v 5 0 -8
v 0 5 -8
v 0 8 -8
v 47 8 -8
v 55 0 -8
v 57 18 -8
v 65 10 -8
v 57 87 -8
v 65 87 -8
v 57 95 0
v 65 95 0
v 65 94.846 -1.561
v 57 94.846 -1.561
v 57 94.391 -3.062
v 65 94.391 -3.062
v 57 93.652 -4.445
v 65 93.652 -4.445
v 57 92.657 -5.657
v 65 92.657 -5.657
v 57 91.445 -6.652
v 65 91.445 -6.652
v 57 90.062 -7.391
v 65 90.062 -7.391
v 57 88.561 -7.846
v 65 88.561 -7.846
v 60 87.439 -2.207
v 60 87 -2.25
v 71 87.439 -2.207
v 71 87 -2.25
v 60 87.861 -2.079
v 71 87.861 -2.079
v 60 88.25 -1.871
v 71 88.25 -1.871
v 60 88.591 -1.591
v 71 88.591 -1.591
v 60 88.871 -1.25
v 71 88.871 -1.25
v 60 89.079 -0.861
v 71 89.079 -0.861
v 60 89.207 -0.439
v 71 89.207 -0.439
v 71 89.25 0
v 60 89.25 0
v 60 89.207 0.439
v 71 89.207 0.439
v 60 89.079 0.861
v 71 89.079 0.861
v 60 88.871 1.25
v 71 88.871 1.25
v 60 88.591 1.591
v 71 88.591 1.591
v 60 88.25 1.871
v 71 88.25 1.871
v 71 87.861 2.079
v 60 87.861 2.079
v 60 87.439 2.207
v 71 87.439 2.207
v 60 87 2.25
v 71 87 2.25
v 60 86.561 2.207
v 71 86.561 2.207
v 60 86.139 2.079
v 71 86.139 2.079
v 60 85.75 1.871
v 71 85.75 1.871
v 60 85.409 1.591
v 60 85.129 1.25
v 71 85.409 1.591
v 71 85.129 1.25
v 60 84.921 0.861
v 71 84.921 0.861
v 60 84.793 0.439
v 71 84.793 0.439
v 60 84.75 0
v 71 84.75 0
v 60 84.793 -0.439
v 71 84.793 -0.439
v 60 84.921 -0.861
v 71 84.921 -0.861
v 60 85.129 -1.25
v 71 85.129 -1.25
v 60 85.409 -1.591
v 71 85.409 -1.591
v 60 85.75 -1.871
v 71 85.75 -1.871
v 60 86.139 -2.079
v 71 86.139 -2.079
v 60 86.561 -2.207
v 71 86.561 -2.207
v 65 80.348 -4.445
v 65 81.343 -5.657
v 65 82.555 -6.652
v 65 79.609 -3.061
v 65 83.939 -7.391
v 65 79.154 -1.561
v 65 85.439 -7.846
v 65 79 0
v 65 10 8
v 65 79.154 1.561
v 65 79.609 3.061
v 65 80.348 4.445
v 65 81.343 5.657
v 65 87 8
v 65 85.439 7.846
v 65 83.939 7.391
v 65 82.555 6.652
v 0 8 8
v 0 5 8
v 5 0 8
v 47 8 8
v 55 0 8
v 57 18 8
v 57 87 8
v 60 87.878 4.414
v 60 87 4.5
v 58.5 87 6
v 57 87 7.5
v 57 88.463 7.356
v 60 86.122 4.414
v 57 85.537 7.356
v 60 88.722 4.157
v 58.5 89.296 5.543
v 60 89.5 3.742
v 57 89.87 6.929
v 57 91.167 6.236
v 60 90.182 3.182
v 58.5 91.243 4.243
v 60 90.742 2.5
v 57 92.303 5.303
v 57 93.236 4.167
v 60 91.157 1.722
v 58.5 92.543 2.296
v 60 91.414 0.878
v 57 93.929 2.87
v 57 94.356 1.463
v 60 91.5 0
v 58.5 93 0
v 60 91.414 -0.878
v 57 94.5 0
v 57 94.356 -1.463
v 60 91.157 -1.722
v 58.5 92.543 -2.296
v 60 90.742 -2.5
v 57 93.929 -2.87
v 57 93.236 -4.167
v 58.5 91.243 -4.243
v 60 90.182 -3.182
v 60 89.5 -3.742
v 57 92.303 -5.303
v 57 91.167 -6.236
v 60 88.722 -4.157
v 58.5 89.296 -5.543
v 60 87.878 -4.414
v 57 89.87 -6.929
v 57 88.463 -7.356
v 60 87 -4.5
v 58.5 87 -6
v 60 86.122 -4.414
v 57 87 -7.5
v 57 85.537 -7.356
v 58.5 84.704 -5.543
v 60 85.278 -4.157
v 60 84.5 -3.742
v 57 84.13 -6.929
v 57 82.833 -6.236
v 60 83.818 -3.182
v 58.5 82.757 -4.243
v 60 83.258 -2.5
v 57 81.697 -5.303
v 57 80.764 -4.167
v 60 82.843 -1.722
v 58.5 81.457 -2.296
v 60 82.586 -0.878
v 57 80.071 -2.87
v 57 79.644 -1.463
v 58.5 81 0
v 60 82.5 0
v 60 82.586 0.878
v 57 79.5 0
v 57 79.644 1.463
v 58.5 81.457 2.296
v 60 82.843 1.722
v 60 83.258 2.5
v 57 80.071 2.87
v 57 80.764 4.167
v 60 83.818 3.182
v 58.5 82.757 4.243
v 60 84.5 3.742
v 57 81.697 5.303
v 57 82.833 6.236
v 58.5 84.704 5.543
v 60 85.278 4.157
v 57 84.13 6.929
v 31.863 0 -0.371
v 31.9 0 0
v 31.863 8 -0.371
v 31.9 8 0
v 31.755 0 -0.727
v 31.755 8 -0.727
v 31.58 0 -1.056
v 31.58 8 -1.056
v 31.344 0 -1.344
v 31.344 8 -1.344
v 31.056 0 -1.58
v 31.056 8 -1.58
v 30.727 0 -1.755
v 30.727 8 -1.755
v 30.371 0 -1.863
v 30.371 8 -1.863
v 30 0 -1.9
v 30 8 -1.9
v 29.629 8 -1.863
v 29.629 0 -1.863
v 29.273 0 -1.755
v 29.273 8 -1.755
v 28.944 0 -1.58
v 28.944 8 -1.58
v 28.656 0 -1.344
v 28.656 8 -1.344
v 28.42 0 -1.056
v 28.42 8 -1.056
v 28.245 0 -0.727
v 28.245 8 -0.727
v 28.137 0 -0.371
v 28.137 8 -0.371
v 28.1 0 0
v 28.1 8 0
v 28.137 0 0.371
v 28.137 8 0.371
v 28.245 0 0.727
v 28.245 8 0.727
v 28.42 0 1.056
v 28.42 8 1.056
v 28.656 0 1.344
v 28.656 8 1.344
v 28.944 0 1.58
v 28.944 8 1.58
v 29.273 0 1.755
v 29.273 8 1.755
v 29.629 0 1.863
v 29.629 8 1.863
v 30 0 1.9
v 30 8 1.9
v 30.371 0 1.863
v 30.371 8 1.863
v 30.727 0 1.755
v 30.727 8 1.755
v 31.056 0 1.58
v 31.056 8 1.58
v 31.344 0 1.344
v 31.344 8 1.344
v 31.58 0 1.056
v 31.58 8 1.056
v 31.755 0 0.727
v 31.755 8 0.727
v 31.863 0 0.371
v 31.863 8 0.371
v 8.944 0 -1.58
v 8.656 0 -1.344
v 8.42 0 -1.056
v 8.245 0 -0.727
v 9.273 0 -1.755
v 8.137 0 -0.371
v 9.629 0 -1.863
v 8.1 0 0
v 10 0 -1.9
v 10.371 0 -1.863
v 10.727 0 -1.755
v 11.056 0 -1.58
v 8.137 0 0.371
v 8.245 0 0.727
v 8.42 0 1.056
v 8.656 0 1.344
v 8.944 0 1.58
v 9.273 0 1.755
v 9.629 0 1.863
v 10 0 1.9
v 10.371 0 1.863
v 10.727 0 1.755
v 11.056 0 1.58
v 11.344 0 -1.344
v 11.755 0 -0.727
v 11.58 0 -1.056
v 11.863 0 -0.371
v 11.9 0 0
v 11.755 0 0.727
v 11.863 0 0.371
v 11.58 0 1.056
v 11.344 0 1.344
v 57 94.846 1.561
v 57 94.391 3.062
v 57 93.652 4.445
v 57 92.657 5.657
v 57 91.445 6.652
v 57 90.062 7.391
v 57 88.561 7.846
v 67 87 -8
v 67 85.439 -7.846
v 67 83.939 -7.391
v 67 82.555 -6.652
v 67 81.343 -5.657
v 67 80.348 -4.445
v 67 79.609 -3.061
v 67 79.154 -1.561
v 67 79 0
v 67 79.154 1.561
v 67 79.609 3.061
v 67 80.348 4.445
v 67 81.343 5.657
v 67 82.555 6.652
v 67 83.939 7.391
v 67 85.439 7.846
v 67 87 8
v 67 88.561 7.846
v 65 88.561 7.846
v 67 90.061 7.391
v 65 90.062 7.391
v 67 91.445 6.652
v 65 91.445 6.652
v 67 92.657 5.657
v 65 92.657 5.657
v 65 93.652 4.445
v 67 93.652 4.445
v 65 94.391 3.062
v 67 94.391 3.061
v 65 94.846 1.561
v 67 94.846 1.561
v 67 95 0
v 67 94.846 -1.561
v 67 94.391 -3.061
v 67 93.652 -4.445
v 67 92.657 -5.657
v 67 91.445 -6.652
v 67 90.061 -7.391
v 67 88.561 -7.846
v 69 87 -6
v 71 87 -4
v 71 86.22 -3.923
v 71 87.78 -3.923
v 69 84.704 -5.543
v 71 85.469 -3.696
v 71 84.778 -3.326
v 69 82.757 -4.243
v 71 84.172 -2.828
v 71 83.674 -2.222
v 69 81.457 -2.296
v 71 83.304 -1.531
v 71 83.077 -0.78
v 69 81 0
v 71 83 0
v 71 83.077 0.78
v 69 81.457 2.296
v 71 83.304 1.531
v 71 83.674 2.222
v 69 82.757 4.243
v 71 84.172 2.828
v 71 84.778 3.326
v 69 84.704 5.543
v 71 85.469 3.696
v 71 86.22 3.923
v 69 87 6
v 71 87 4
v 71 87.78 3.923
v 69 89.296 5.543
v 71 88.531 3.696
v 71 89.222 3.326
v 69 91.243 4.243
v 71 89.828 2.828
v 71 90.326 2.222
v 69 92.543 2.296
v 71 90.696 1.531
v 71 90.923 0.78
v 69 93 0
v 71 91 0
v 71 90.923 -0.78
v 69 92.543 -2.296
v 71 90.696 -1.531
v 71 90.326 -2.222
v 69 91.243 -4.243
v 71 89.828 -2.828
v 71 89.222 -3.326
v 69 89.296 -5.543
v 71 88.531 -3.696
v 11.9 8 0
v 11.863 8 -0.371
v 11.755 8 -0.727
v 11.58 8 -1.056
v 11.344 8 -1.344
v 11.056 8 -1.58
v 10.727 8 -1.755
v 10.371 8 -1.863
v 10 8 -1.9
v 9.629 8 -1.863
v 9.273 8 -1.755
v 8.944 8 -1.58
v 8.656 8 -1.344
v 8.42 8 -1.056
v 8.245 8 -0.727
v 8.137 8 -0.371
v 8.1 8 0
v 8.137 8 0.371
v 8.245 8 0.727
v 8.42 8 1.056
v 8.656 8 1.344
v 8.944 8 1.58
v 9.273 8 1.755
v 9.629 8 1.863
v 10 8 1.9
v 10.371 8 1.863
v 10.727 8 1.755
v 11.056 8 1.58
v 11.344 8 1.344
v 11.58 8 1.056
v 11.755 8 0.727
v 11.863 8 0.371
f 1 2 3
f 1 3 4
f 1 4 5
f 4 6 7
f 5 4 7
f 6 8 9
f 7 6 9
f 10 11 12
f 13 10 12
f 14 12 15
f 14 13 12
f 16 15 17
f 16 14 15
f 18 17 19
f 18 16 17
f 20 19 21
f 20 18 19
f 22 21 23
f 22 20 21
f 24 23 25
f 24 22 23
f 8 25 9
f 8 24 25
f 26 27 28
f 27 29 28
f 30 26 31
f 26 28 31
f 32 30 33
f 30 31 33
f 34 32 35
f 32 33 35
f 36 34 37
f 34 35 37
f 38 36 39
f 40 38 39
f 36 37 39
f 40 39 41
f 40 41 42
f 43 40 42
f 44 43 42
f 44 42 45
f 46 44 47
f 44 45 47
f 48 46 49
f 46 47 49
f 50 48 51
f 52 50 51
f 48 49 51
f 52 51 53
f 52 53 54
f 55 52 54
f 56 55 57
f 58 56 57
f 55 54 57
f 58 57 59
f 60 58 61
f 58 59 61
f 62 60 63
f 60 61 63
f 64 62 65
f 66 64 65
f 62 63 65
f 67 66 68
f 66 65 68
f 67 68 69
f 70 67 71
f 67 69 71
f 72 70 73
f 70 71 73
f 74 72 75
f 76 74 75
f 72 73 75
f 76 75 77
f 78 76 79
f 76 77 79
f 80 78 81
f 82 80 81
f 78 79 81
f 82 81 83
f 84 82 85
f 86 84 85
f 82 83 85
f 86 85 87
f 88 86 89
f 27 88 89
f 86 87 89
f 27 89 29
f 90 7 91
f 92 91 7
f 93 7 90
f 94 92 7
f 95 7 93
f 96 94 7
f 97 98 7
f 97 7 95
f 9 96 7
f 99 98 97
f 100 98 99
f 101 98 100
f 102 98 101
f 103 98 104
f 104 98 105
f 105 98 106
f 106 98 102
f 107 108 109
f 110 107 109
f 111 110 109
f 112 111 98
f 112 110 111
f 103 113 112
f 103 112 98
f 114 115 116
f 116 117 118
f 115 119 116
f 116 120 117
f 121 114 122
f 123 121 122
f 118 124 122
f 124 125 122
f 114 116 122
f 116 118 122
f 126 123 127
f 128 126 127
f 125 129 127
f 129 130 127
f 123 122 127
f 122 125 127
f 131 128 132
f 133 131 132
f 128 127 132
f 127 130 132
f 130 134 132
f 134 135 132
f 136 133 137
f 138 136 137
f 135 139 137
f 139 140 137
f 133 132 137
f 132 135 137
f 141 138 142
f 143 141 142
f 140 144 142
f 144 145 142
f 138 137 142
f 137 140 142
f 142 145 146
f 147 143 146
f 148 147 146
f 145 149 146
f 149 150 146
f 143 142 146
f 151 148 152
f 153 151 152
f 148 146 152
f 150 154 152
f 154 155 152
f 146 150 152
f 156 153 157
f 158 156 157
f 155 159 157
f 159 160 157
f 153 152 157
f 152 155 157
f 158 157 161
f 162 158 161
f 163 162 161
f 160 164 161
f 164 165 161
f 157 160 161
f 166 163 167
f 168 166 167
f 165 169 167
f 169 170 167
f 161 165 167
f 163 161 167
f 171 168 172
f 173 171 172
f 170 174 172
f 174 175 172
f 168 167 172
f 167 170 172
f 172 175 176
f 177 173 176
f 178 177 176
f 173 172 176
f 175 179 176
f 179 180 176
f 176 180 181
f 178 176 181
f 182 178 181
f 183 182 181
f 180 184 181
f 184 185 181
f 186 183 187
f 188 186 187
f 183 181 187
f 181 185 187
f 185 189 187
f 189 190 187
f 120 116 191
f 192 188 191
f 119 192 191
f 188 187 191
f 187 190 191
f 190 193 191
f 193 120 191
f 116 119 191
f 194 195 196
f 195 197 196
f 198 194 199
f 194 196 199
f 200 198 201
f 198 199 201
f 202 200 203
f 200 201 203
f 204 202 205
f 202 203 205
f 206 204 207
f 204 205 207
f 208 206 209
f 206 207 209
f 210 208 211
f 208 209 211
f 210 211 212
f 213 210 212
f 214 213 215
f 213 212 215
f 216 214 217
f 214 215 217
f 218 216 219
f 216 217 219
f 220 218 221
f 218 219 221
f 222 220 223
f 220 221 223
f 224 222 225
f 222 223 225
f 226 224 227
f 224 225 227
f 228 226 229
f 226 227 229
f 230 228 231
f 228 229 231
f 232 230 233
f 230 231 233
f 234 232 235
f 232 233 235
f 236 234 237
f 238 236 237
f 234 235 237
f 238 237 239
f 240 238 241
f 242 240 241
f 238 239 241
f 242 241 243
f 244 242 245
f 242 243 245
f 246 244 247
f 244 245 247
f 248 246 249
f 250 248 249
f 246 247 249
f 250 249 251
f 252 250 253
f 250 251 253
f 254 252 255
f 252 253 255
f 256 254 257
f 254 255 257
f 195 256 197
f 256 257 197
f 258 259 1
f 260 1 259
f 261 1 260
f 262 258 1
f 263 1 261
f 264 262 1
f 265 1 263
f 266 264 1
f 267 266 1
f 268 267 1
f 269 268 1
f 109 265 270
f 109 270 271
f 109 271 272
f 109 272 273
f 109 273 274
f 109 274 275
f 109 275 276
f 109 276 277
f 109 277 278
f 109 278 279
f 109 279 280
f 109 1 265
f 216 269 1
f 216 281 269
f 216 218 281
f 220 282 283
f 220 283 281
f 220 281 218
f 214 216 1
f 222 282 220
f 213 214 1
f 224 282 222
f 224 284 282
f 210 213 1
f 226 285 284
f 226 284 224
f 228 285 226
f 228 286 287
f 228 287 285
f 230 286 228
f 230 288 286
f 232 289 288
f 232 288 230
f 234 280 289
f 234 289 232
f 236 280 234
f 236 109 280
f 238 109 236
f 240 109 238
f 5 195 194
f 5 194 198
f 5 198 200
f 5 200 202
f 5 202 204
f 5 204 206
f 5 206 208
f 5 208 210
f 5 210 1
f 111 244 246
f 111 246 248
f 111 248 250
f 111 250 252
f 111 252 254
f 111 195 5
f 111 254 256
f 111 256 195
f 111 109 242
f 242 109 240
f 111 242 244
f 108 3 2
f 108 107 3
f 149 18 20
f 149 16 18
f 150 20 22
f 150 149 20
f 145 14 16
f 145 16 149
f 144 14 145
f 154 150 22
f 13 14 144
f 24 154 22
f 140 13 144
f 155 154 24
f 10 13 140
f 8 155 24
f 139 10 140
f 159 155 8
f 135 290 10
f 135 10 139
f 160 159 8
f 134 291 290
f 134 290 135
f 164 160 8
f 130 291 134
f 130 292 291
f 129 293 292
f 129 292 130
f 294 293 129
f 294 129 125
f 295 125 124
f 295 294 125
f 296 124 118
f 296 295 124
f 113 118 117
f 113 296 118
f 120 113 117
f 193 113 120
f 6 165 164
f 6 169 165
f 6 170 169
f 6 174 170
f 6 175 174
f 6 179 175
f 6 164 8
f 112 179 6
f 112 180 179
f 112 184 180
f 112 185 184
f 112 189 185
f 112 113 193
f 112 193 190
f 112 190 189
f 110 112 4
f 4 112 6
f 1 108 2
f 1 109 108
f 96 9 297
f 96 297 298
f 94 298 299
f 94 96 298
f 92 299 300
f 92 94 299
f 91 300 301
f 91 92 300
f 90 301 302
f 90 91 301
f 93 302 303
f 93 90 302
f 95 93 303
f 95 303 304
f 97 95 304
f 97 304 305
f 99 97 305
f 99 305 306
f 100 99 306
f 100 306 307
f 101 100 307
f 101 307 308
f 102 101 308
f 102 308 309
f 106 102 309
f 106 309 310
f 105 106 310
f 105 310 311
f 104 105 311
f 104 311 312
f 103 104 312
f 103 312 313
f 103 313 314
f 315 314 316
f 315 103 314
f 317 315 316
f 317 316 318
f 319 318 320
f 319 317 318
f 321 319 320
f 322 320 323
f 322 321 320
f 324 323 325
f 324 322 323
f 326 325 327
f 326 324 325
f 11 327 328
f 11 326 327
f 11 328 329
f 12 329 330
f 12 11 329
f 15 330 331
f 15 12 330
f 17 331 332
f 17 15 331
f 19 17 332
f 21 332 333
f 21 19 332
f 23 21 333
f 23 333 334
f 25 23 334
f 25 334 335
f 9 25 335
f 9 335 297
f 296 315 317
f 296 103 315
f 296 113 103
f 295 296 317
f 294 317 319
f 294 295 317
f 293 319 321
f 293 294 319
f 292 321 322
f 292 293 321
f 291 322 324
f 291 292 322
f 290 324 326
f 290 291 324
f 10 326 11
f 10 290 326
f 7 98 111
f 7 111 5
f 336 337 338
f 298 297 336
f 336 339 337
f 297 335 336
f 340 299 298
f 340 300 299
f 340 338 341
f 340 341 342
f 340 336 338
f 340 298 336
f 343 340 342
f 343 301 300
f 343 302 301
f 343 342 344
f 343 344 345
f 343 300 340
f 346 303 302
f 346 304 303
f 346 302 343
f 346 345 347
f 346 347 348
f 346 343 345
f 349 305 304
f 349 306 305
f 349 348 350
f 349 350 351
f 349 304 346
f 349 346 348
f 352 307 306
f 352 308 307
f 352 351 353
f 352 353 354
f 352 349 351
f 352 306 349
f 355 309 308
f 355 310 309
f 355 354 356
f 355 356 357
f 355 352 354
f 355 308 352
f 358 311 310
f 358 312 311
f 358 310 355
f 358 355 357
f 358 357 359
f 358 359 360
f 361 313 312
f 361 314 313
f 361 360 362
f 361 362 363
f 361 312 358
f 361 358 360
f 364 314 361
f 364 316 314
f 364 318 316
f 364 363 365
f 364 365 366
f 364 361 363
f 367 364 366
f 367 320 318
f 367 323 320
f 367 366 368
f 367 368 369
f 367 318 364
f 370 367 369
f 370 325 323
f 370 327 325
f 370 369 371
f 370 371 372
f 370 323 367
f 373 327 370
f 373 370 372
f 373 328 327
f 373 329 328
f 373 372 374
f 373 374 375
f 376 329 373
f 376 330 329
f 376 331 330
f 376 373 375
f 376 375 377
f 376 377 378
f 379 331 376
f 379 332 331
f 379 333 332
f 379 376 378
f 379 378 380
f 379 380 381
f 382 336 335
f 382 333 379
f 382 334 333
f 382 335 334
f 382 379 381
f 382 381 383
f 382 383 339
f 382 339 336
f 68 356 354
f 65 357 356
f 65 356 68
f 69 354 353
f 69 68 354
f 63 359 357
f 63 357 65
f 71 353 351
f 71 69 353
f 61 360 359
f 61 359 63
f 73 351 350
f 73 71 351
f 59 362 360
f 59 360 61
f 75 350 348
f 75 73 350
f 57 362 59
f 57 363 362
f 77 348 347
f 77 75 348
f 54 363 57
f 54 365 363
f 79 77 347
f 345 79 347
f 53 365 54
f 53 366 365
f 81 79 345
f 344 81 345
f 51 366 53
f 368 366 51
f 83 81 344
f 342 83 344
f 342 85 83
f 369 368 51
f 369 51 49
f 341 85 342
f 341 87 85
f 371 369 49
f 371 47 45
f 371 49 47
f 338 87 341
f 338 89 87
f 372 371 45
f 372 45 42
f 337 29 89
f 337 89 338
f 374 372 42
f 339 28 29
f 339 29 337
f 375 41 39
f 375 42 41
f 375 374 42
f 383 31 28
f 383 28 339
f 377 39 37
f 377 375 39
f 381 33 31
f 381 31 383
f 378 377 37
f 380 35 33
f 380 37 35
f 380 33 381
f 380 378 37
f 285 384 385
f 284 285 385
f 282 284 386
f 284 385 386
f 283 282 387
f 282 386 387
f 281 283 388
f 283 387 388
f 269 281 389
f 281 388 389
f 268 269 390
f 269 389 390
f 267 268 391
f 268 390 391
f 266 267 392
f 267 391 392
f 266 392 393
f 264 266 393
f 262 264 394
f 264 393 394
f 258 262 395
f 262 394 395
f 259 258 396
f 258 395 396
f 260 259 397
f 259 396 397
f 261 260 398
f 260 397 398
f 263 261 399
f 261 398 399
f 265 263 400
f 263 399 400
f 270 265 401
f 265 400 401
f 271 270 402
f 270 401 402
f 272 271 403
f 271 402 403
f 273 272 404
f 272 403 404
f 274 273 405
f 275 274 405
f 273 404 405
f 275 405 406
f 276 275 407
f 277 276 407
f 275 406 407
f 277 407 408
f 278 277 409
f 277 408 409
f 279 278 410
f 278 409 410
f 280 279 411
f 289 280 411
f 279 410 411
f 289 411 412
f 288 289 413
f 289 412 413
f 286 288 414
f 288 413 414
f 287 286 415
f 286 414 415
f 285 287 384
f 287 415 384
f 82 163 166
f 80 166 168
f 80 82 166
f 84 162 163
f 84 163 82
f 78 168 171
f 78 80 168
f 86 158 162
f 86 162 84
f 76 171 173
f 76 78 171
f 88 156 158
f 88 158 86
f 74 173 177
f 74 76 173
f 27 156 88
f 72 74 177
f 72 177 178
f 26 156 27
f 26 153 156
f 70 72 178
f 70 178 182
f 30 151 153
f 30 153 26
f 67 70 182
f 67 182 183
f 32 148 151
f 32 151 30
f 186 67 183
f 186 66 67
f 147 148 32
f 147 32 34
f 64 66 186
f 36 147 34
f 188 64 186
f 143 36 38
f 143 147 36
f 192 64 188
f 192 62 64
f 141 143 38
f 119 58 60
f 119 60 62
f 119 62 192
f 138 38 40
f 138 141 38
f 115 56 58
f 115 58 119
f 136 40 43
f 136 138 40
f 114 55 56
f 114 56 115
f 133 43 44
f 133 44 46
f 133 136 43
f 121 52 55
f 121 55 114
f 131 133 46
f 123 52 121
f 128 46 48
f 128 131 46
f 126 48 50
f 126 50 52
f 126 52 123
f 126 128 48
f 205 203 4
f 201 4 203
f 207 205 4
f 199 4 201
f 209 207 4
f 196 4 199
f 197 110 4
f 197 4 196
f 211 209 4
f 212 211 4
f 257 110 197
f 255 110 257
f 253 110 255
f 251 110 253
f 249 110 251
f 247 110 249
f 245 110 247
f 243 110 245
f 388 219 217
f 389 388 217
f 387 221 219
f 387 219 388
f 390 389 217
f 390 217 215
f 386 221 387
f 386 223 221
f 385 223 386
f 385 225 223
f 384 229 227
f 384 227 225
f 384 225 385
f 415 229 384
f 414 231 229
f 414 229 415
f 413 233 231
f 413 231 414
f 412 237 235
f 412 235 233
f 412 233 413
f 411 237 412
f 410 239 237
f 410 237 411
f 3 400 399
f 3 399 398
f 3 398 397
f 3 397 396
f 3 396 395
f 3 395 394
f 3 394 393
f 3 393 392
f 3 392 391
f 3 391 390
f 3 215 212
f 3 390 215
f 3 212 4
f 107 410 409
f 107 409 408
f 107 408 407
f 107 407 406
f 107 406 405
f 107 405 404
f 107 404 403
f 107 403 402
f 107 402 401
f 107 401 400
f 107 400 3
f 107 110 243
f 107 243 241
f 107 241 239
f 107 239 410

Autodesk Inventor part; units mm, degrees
ref_plane "YZ Plane" through (0, 0, 0) normal (1, 0, 0) x (0, 1, 0)
ref_plane "XZ Plane" through (0, 0, 0) normal (0, 1, 0) x (-1, 0, 0)
ref_plane "XY Plane" through (0, 0, 0) normal (0, 0, 1) x (1, 0, 0)
sketch "Sketch3" plane through (0, 0, 0) normal (0, 0, 1) x (1, 0, 0)
  line L0 (0, 0) -> (65, 0)
  line L1 (65, 0) -> (65, 95)
  line L2 (65, 95) -> (57, 95)
  line L3 (57, 95) -> (57, 8)
  line L4 (57, 8) -> (0, 8)
  line L5 (0, 8) -> (0, 0)
  dimension "d17" = 8
  dimension "d18" = 57
  dimension "d19" = 87
  dimension "d20" = 8
extrude "Extrusion3" add sketch "Sketch3" against normal mid plane 16
sketch "Sketch5" plane through (0, 8, -8) normal (0, 1, 0) x (1, 0, 0)
  line L0 (-13, -8) -> (78, -8) projected
  circle A0 centre (10, -8) radius 1.9
  circle A1 centre (30, -8) radius 1.9
  line L1 (0, 0) -> (0, -16) projected
  point P0 (0, -8)
  dimension "d23" = 3.8
  dimension "d24" = 3.8
  dimension "d25" = 10
  dimension "d26" = 20
extrude "Extrusion4" cut sketch "Sketch5" against normal through all
chamfer "Chamfer2" distance 5 angle 45 1 edges at (0, 0, 0)
chamfer "Chamfer3" distance 10 angle 45 1 edges at (57, 8, 0)
chamfer "Chamfer4" distance 10 angle 45 1 edges at (65, 0, 0)
sketch "Sketch6" plane through (65, 95, 8) normal (1, 0, 0) x (0, 0, -1)
  line L0 (16, -77) -> (16, 0) projected
  line L1 (0, -85) -> (0, 0) projected
  circle A0 centre (8, -8) radius 8
  line L2 (16, 0) -> (0, 0) projected
  point P0 (8, -95)
  dimension "d39" = 16
extrude "Extrusion5" add sketch "Sketch6" along normal blind 7 contours A0
fillet "Fillet1" radius 8 2 edges at (61, 95, -8) (61, 95, 8)
sketch "Sketch7" plane through (57, 18, -8) normal (-1, 0, 0) x (0, 0, 1)
  point P0 (8, -18)
sketch "Sketch8" plane through (72, 87, 0) normal (1, 0, 0) x (0, 0, -1)
  circle A0 centre (0, 0) radius 8 projected
  circle A1 centre (0, 0) radius 2.75
  point P0 (0, -87)
  dimension "d43" = 5.5
extrude "Extrusion6" add sketch "Sketch8" along normal blind 4 contours A1
sketch "Sketch9" plane through (76, 87, 0) normal (1, 0, 0) x (0, 0, -1)
  circle A0 centre (0, 0) radius 2.75 construction
  circle A1 centre (0, 0) radius 2.25
  point P0 (0, -87)
  dimension "d46" = 4.5
extrude "Extrusion7" cut sketch "Sketch9" against normal through all
sketch "Sketch10" plane through (57, 18, -8) normal (-1, 0, 0) x (0, 0, 1)
  circle A0 centre (8, 69) radius 2.25 projected
  circle A1 centre (8, 69) radius 4.5
  point P0 (8, -18)
  dimension "d49" = 9
extrude "Extrusion8" cut sketch "Sketch10" against normal blind 3
chamfer "Chamfer5" distance 3 angle 45 1 edges at (57, 87, -4.5)
chamfer "Chamfer6" distance 3 angle 45 1 edges at (72, 87, 2.75)
sketch "Sketch11" plane through (76, 87, 0) normal (1, 0, 0) x (0, 0, -1)
  circle A0 centre (0, 0) radius 2.25 projected
  circle A1 centre (0, 0) radius 10.166
  point P0 (0, -87)
extrude "Extrusion9" cut sketch "Sketch11" against normal blind 5
chamfer "Chamfer7" distance 4 angle 45 1 edges at (71, 87, 8)
equation "\"d20\" = d17"
properties part number "LinearActuatorToBottomPlateAdapter"
